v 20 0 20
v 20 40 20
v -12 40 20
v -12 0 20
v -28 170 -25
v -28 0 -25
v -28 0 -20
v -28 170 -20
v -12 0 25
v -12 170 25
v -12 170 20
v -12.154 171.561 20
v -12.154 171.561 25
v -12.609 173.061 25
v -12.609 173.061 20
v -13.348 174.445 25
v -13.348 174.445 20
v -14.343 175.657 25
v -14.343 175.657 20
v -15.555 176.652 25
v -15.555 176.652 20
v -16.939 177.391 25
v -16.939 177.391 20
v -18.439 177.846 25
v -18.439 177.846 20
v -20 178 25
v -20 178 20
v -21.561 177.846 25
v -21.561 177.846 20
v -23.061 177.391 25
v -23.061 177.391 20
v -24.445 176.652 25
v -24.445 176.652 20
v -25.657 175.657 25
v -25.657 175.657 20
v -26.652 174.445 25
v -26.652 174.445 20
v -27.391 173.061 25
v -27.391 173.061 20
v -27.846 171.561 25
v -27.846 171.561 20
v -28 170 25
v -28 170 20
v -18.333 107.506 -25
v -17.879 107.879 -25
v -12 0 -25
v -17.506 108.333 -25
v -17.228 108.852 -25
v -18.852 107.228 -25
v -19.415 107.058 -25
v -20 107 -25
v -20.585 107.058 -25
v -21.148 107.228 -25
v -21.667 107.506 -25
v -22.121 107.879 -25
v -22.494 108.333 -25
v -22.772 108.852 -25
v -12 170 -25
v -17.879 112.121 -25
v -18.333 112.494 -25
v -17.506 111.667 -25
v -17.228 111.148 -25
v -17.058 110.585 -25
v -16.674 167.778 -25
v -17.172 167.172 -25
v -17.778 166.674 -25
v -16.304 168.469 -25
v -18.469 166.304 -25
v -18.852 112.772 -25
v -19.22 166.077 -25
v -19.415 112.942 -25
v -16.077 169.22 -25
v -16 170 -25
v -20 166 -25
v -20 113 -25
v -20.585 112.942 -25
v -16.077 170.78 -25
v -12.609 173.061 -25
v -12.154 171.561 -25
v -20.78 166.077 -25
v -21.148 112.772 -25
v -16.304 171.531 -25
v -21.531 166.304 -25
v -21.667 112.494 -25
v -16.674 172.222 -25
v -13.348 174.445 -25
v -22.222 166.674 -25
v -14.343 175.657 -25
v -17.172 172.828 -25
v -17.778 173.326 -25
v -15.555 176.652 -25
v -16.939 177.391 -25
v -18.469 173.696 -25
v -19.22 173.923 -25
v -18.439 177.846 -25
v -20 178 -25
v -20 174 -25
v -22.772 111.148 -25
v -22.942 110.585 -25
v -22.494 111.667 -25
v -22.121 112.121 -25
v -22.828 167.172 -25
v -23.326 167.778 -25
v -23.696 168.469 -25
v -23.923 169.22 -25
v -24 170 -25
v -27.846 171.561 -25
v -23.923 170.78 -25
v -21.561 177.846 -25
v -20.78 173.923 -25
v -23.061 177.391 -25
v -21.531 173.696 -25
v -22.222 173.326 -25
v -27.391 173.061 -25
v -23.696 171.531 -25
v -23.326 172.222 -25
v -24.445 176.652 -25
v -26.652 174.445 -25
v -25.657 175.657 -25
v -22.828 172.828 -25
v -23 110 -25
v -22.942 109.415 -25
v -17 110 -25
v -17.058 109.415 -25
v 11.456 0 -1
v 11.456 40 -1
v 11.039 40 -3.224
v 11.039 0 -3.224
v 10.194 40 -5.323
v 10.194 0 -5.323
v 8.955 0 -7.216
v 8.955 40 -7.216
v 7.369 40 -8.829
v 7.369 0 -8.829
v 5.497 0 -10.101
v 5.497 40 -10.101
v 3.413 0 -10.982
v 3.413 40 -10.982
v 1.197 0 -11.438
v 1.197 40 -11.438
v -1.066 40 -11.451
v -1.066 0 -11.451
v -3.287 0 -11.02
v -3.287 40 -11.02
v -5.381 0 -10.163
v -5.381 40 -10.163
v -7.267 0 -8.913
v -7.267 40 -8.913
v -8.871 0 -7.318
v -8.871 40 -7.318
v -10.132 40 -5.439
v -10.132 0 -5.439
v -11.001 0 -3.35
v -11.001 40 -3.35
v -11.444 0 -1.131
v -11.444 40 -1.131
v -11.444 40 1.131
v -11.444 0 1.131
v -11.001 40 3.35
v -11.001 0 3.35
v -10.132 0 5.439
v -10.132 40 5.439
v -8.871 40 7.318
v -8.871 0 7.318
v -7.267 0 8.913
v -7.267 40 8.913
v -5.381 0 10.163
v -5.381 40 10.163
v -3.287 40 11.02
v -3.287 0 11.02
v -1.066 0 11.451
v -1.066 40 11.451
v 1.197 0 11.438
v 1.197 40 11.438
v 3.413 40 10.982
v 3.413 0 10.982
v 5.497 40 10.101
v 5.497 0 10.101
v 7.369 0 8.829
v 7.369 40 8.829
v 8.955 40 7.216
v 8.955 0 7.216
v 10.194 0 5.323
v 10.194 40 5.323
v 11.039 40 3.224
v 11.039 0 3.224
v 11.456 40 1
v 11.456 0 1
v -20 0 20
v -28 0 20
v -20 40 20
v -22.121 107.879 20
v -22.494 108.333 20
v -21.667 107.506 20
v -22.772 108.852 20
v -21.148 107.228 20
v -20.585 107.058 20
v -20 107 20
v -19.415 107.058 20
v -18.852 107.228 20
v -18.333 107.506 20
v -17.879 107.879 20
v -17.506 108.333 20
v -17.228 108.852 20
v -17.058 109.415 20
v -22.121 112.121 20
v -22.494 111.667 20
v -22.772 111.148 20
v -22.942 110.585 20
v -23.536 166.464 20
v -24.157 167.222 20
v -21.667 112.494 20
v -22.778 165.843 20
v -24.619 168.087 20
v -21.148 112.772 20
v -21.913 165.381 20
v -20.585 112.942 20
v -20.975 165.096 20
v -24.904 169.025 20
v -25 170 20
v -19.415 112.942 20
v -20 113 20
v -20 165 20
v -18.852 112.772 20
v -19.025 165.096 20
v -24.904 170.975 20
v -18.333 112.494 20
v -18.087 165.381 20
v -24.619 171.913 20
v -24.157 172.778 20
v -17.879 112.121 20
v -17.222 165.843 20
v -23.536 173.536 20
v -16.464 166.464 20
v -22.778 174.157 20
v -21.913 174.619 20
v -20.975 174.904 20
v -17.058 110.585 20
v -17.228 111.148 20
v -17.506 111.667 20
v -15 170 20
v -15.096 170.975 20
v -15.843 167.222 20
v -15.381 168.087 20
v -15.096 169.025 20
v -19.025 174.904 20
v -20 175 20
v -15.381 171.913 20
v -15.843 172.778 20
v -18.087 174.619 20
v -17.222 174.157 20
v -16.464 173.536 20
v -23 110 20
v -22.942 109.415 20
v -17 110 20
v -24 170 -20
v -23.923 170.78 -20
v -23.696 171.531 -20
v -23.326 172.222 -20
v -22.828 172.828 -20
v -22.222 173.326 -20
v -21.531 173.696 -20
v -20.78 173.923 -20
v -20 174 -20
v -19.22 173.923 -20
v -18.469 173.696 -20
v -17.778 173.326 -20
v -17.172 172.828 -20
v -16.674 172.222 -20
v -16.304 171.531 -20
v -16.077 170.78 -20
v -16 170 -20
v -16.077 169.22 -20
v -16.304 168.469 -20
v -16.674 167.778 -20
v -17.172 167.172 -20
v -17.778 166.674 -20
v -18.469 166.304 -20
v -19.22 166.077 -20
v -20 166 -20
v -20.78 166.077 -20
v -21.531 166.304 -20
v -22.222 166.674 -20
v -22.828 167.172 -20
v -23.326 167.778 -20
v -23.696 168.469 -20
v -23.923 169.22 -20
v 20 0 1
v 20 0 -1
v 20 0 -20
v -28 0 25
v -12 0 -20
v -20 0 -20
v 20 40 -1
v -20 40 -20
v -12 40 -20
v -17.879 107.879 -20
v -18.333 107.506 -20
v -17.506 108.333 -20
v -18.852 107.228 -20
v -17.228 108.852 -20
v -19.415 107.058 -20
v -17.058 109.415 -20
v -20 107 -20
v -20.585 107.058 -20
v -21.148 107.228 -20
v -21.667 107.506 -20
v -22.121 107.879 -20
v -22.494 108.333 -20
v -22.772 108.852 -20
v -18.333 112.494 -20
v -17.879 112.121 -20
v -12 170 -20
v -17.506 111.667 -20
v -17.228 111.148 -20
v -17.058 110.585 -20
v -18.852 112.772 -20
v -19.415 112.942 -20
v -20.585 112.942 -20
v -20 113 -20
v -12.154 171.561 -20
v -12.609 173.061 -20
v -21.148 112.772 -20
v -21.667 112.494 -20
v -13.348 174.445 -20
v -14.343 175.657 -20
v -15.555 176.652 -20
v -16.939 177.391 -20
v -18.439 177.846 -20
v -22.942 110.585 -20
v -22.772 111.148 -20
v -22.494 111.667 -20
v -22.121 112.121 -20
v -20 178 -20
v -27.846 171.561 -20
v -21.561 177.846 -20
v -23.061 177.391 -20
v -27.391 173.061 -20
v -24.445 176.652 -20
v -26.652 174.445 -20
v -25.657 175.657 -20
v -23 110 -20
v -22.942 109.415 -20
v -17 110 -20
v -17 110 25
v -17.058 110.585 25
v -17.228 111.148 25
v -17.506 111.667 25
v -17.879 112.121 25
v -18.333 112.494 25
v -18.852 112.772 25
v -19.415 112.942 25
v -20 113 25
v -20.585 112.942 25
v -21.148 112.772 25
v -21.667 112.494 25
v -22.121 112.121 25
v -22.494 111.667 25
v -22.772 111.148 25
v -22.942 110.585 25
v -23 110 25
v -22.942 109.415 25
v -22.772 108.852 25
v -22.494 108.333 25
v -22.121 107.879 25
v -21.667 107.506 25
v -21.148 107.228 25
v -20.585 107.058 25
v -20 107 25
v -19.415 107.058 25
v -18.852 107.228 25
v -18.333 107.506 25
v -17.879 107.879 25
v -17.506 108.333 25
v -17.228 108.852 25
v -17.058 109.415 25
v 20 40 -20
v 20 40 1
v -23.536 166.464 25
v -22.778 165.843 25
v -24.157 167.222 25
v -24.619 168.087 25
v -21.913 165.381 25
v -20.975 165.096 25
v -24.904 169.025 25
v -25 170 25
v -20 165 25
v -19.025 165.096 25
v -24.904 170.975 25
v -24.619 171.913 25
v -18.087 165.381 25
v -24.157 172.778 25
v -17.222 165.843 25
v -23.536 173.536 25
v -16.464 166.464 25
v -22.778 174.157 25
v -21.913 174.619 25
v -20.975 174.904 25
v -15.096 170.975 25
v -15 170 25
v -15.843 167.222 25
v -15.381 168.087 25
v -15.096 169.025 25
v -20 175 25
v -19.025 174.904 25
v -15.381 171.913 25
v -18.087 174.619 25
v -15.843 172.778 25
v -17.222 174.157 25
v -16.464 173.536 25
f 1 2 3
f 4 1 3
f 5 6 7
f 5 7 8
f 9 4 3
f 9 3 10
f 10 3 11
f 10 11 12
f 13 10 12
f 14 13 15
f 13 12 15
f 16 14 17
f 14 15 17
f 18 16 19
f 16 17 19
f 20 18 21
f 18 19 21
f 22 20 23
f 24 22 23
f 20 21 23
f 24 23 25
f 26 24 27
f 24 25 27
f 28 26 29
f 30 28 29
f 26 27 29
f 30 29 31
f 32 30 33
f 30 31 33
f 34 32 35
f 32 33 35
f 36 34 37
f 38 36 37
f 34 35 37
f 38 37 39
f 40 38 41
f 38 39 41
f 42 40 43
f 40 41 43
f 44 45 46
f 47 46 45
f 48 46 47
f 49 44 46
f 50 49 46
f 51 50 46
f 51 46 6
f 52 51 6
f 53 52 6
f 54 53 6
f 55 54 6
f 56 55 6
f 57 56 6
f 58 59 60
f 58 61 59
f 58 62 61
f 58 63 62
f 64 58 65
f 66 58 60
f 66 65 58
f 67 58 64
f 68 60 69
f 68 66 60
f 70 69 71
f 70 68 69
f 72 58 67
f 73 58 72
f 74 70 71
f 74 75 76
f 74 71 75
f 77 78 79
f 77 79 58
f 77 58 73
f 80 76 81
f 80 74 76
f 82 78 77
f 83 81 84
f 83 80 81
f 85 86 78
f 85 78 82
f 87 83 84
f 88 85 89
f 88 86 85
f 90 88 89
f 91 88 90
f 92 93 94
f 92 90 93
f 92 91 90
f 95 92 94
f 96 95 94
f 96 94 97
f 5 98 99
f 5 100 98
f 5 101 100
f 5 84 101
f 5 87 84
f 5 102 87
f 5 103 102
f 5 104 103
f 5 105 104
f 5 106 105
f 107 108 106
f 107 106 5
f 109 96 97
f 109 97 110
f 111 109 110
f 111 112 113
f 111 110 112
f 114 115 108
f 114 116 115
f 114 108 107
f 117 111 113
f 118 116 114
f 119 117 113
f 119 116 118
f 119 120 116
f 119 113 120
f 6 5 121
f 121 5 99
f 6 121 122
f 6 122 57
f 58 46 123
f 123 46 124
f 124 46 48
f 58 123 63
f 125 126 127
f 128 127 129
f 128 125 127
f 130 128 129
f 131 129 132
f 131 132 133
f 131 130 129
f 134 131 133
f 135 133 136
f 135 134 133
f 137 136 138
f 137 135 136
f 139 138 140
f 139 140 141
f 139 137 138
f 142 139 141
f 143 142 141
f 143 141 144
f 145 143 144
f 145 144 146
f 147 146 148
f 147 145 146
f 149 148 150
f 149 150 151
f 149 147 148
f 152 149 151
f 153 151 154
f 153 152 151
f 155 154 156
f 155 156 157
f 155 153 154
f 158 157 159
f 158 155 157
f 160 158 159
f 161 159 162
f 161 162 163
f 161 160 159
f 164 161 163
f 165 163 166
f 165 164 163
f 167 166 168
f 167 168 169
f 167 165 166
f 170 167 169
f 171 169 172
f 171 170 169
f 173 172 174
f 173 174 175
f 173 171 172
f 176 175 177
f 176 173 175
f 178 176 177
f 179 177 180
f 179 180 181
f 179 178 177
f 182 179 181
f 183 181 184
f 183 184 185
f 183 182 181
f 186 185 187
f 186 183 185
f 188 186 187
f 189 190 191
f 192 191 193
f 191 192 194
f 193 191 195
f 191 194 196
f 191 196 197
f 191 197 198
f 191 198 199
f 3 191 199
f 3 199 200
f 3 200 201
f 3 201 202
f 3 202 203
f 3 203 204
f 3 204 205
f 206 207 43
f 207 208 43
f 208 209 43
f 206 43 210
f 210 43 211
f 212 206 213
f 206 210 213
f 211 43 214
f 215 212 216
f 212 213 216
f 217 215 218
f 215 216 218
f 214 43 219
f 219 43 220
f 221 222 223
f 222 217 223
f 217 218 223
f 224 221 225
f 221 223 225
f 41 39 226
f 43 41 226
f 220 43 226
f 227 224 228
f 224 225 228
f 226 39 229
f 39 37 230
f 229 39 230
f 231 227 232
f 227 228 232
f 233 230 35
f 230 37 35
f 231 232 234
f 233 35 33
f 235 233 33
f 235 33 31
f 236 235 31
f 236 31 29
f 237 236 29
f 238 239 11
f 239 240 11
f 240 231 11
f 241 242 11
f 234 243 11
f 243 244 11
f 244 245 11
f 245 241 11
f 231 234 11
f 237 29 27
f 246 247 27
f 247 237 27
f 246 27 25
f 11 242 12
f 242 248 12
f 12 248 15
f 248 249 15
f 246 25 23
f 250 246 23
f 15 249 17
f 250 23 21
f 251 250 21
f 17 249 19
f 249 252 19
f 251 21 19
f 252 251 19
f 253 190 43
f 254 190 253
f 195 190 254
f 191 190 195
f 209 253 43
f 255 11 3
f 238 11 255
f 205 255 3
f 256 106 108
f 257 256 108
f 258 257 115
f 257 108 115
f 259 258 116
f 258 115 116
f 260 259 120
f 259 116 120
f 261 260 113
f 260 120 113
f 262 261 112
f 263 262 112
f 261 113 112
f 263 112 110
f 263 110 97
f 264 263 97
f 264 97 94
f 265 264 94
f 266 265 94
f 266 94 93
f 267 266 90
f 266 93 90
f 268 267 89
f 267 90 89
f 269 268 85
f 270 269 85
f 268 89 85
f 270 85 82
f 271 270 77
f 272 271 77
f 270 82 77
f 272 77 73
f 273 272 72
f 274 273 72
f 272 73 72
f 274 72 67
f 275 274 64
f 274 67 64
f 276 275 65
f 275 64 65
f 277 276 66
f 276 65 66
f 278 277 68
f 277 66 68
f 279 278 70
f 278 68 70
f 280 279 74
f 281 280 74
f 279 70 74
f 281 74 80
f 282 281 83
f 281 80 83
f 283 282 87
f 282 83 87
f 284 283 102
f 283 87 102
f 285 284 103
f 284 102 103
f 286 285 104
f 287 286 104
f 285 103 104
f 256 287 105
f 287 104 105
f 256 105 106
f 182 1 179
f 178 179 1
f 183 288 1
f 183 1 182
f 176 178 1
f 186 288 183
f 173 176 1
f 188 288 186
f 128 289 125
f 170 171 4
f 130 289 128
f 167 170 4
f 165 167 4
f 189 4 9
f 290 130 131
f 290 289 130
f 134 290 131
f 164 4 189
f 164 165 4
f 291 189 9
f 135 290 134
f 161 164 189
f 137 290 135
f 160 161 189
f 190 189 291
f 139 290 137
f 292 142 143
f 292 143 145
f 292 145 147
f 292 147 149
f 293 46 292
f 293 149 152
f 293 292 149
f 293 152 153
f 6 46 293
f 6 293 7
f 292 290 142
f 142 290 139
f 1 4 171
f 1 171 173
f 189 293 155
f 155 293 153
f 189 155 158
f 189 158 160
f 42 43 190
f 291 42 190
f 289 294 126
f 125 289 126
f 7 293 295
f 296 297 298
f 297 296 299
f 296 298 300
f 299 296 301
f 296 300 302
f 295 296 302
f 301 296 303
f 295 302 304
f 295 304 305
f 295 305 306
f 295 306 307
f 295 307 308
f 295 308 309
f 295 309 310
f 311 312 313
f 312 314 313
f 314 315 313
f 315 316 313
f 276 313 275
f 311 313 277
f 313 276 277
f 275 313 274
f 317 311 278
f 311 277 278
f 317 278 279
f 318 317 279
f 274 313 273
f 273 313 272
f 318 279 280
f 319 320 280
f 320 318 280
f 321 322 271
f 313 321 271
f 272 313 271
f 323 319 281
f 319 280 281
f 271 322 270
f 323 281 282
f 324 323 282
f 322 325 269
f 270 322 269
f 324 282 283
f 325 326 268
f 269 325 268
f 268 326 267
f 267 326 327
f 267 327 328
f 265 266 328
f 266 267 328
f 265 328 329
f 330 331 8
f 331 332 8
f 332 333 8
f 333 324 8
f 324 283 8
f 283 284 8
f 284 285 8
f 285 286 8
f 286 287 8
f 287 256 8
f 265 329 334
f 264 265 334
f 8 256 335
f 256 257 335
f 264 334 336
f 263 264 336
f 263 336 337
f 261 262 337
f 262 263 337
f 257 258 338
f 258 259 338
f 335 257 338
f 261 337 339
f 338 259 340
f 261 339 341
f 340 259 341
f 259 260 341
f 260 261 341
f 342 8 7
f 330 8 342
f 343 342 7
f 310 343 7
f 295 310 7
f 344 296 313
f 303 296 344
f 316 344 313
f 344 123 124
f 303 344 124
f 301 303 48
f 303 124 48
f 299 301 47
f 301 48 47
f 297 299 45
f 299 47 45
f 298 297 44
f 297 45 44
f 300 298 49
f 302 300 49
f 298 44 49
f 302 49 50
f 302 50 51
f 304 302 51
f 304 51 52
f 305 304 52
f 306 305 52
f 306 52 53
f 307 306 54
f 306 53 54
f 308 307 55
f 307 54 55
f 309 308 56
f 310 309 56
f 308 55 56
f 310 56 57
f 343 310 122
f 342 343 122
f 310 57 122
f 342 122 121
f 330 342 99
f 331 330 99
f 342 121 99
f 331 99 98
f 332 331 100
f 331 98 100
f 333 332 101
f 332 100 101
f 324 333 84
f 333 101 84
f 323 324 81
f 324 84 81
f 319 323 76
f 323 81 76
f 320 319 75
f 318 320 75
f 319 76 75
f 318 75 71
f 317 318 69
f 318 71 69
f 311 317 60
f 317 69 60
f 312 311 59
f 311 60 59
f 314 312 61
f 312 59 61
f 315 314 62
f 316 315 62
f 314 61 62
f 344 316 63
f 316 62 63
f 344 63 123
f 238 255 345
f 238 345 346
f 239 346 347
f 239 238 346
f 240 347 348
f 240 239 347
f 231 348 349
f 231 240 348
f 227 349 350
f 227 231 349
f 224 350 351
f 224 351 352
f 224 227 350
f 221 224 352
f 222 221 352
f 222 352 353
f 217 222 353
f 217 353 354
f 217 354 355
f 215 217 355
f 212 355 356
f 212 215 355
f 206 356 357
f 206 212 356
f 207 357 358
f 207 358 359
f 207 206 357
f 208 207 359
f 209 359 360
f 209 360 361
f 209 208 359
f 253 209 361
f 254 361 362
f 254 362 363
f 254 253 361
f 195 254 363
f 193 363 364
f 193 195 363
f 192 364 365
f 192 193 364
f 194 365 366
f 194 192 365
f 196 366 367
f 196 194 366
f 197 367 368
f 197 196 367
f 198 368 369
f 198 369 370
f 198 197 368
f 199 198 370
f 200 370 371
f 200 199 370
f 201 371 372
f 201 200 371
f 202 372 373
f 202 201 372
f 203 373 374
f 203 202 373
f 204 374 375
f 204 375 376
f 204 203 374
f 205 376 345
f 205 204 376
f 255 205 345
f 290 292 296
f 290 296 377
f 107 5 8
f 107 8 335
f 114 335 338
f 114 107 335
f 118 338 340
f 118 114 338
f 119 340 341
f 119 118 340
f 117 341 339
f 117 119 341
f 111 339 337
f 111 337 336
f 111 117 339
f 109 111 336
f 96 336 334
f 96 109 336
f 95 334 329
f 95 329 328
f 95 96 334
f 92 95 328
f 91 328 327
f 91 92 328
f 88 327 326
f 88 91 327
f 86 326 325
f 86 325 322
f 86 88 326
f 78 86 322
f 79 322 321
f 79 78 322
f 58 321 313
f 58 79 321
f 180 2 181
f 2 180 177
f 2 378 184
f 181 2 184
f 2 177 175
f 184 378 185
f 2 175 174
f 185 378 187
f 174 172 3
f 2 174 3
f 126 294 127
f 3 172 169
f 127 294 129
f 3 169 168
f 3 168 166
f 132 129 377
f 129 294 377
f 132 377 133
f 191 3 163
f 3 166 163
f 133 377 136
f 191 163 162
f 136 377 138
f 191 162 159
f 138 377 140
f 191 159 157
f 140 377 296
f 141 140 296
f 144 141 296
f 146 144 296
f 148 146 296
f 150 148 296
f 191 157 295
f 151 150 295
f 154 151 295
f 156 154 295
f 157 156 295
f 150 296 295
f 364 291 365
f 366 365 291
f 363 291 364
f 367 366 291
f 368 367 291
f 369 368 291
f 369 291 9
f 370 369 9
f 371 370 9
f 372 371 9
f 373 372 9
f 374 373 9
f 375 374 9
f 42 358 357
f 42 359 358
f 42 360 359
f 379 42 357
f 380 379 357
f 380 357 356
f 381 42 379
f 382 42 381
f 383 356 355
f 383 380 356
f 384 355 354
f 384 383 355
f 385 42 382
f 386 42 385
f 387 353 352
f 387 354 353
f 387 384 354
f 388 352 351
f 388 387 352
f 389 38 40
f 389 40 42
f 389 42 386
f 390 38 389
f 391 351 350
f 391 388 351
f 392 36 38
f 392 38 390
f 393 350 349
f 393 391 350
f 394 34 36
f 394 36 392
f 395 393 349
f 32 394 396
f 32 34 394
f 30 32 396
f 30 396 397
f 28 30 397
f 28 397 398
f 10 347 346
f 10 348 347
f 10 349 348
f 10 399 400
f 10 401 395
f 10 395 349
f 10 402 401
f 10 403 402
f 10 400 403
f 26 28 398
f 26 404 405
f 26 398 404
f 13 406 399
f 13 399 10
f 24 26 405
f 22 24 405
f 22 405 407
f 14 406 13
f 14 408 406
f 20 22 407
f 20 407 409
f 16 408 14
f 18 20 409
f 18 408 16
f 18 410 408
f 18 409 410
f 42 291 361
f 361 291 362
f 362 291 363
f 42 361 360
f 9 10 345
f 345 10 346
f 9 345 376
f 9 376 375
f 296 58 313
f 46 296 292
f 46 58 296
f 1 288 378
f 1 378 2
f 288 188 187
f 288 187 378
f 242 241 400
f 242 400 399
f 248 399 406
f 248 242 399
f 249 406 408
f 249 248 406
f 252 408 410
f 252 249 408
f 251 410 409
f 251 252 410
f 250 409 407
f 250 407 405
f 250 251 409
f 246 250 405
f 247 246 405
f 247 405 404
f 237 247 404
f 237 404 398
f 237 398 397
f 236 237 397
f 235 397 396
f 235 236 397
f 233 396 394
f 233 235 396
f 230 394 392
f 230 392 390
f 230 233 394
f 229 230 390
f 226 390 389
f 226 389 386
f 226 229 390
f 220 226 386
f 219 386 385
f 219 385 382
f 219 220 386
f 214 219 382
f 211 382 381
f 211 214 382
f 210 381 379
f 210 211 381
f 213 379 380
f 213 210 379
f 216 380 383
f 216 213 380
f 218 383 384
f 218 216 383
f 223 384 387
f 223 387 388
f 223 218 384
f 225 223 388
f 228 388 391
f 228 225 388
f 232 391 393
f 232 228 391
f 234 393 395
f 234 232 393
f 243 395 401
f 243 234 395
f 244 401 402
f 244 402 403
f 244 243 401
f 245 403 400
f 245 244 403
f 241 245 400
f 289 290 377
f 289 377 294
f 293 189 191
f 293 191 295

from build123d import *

# Parameters (mm, degrees)
EXTRUDE1_DEPTH = 40
SKETCH3_R      = 5
SKETCH3_R_2    = 3
EXTRUDE2_DEPTH = 5
EXTRUDE3_START = 5
SKETCH4_R      = 4
SKETCH4_R_2    = 3
EXTRUDE3_DEPTH = 5


with BuildPart() as part:
    # Sketch2 → Extrude1 (new body)
    with BuildSketch(Plane(origin=(0, 0, 0), x_dir=(1, 0, 0), z_dir=(0, 1, 0))):
        with BuildLine():
            Line((-20, 20), (20, 20))
            Line((20, 20), (20, 1))
            Line((20, 1), (11.456439237, 1))
            ThreePointArc((11.456439237, 1), (-11.5, 0), (11.456439237, -1))
            Line((11.456439237, -1), (20, -1))
            Line((20, -1), (20, -20))
            Line((20, -20), (-20, -20))
            Line((-20, -20), (-20, 20))
        make_face()
    extrude(amount=EXTRUDE1_DEPTH)

    # Sketch3 → Extrude2 (add)
    with BuildSketch(Plane.XY.offset(20)):
        with BuildLine():
            Line((-28, 170), (-28, 0))
            Line((-28, 0), (-12, 0))
            Line((-12, 0), (-12, 170))
            ThreePointArc((-12, 170), (-20, 178), (-28, 170))
        make_face()
        with Locations((-20, 170)):
            Circle(SKETCH3_R, mode=Mode.SUBTRACT)
        with Locations((-20, 110)):
            Circle(SKETCH3_R_2, mode=Mode.SUBTRACT)
    extrude(amount=EXTRUDE2_DEPTH)

    # Sketch4 → Extrude3 (add)
    with BuildSketch(Plane(origin=(0, 0, -20), x_dir=(-1, 0, 0), z_dir=(0, 0, -1)).offset(EXTRUDE3_START)):
        with BuildLine():
            Line((12, 0), (28, 0))
            Line((28, 0), (28, 170))
            ThreePointArc((28, 170), (20, 178), (12, 170))
            Line((12, 170), (12, 0))
        make_face()
        with Locations((20, 170)):
            Circle(SKETCH4_R, mode=Mode.SUBTRACT)
        with Locations(Location((20, 110, 0), (0, 0, 180))):
            Circle(SKETCH4_R_2, mode=Mode.SUBTRACT)
    extrude(amount=-EXTRUDE3_DEPTH)


solid = part.part
